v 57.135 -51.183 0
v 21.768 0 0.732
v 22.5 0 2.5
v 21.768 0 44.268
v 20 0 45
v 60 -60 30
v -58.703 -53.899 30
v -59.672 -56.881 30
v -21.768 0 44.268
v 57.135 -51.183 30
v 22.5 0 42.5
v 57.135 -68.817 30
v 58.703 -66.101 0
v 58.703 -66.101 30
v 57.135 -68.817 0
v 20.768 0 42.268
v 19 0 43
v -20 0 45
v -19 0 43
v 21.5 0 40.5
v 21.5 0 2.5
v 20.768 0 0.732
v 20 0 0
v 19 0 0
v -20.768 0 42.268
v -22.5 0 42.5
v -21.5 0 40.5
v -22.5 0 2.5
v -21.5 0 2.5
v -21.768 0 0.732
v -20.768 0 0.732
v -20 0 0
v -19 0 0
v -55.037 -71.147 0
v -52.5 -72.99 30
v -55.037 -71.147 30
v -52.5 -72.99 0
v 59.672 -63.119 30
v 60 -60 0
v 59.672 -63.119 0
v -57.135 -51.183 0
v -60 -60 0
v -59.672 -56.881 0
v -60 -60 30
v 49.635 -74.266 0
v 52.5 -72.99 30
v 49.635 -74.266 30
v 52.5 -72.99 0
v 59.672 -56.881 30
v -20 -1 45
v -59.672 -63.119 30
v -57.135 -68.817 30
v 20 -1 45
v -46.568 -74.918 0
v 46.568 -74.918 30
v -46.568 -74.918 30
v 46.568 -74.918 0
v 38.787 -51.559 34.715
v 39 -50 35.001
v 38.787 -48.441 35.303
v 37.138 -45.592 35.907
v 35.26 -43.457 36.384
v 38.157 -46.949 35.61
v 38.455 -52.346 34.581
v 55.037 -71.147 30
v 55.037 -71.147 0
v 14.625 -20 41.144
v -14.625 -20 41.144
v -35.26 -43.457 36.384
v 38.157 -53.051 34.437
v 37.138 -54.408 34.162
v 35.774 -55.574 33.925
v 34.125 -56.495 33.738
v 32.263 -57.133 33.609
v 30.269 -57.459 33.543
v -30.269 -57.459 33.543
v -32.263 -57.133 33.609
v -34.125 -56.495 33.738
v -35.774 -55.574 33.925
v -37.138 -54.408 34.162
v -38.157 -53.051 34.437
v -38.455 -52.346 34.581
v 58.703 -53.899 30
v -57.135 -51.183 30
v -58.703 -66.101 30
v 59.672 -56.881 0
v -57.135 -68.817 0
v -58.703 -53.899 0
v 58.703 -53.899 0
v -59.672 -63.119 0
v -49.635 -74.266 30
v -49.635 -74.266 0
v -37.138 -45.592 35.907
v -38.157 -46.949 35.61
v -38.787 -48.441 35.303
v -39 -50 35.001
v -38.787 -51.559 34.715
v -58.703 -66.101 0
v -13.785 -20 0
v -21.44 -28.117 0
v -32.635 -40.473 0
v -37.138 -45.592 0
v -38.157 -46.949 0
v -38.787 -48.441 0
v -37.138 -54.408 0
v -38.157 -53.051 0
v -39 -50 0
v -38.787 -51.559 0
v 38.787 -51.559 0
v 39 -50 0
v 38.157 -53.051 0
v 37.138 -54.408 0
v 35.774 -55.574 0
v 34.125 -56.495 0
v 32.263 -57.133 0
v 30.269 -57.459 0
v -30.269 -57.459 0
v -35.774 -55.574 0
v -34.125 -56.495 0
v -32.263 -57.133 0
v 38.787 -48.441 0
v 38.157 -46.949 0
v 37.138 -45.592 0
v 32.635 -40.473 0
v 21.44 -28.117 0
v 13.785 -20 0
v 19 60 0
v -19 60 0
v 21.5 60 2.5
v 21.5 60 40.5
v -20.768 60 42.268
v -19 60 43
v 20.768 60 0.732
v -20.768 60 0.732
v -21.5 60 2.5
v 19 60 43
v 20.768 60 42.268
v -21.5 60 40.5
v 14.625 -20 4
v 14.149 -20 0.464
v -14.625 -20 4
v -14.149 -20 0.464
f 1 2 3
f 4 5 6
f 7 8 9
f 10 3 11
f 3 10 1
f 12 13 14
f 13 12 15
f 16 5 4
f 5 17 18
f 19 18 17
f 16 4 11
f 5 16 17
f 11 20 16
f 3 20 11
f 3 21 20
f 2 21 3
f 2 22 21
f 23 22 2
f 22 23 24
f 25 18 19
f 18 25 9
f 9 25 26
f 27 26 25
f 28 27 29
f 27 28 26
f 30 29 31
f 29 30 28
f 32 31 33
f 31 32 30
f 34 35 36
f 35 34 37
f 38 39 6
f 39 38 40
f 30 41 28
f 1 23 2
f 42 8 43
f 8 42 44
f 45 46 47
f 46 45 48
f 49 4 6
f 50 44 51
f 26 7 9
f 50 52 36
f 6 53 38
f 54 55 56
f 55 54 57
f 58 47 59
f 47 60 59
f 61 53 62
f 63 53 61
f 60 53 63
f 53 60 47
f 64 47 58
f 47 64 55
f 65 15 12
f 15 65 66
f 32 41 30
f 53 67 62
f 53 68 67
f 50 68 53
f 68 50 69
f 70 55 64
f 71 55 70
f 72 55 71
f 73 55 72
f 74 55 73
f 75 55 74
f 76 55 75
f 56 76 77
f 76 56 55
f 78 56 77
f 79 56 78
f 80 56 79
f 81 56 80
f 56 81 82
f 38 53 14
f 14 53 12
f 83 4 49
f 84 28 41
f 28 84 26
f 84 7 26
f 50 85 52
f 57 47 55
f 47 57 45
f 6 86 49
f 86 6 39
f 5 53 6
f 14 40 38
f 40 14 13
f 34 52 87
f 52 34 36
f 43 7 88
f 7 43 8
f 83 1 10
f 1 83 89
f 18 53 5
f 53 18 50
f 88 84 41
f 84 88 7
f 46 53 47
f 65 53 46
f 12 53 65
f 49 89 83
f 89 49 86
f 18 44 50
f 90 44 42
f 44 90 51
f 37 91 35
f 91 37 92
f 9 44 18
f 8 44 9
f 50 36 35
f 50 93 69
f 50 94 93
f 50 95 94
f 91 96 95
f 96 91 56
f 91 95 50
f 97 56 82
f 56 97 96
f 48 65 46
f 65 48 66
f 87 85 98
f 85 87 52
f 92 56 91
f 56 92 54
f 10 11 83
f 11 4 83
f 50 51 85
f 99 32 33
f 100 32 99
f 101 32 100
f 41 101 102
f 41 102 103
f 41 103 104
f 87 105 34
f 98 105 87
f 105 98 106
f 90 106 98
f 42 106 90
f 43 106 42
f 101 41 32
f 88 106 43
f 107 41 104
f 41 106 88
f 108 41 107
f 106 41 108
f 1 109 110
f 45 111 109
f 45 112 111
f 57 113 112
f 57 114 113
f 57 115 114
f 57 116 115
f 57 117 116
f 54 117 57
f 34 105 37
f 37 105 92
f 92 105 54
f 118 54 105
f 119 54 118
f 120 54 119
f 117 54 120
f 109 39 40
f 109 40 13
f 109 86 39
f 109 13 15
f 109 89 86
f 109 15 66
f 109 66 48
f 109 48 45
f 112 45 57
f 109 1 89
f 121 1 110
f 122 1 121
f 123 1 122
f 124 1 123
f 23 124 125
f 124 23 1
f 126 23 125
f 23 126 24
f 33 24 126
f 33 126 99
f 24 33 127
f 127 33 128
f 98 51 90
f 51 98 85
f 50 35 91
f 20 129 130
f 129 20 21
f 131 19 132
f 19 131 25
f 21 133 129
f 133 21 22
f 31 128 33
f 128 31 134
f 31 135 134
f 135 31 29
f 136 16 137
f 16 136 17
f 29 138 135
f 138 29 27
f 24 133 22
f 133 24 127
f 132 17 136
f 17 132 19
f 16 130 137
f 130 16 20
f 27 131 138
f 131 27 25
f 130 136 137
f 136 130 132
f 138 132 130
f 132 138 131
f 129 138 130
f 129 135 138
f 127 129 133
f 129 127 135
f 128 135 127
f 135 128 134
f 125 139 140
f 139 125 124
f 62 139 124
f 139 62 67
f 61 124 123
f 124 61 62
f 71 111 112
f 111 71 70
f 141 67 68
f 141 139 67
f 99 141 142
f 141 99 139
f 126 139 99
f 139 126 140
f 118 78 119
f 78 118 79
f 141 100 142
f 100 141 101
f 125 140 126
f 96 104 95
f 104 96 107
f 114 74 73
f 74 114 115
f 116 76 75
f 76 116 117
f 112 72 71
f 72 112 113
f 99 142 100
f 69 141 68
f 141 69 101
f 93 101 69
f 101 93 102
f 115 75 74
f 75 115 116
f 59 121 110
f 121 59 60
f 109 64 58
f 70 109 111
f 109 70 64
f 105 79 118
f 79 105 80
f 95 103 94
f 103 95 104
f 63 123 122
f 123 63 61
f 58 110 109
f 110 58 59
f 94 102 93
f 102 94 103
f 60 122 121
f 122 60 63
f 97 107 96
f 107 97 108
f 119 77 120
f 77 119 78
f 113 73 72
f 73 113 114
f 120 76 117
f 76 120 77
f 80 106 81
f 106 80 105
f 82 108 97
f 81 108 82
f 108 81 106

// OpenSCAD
// Thule 2" Lift Handle

width = 45;
bodyWidth = 43;

length = 60;

edgeBevel = 2.5;

//cube([45,45,45]);

module innerBody() {
  translate([-bodyWidth/2, 0, 0]) 
    
  difference() {
    hull() {
        translate([edgeBevel, 0, edgeBevel]) 
        rotate([-90, 0, 0]) 
        cylinder(length,edgeBevel,edgeBevel);

        translate([bodyWidth - edgeBevel, 0, bodyWidth - edgeBevel]) 
        rotate([-90, 0, 0]) 
        cylinder(length,edgeBevel,edgeBevel);

        translate([edgeBevel, 0, bodyWidth - edgeBevel]) 
        rotate([-90, 0, 0]) 
        cylinder(length,edgeBevel,edgeBevel);

        translate([bodyWidth - edgeBevel, 0, edgeBevel]) 
        rotate([-90, 0, 0]) 
        cylinder(length,edgeBevel,edgeBevel);
    }

    // remove the pin hole
    //color("#AA0000") translate([-0.5, bodyWidth, bodyWidth/2]) rotate([0,90,0]) cylinder(bodyWidth + 1, 7.5, 7.5);
 
  }
}


module handle() {
    hull() {
        translate([-width/2, 0, 0])  
        hull() {

            translate([edgeBevel, -1, edgeBevel]) 
            rotate([-90, 0, 0]) 
            cylinder(1,edgeBevel,edgeBevel);

            translate([width - edgeBevel, -1, width - edgeBevel]) 
            rotate([-90, 0, 0]) 
            cylinder(1,edgeBevel,edgeBevel);

            translate([edgeBevel, -1, width - edgeBevel]) 
            rotate([-90, 0, 0]) 
            cylinder(1,edgeBevel,edgeBevel);

            translate([width - edgeBevel, -1, edgeBevel]) 
            rotate([-90, 0, 0]) 
            cylinder(1,edgeBevel,edgeBevel);
        }
        
        translate([-45,-60,0]) cylinder(30, 15, 15);
        translate([45,-60,0]) cylinder(30, 15, 15);
    }
}

difference() {
    union() {
        handle();
        innerBody();
    }
    
    translate([0, -20, -1])
    color("#00aa00")
    scale([0.65,0.5,2]) 
        handle();

    
}


    
